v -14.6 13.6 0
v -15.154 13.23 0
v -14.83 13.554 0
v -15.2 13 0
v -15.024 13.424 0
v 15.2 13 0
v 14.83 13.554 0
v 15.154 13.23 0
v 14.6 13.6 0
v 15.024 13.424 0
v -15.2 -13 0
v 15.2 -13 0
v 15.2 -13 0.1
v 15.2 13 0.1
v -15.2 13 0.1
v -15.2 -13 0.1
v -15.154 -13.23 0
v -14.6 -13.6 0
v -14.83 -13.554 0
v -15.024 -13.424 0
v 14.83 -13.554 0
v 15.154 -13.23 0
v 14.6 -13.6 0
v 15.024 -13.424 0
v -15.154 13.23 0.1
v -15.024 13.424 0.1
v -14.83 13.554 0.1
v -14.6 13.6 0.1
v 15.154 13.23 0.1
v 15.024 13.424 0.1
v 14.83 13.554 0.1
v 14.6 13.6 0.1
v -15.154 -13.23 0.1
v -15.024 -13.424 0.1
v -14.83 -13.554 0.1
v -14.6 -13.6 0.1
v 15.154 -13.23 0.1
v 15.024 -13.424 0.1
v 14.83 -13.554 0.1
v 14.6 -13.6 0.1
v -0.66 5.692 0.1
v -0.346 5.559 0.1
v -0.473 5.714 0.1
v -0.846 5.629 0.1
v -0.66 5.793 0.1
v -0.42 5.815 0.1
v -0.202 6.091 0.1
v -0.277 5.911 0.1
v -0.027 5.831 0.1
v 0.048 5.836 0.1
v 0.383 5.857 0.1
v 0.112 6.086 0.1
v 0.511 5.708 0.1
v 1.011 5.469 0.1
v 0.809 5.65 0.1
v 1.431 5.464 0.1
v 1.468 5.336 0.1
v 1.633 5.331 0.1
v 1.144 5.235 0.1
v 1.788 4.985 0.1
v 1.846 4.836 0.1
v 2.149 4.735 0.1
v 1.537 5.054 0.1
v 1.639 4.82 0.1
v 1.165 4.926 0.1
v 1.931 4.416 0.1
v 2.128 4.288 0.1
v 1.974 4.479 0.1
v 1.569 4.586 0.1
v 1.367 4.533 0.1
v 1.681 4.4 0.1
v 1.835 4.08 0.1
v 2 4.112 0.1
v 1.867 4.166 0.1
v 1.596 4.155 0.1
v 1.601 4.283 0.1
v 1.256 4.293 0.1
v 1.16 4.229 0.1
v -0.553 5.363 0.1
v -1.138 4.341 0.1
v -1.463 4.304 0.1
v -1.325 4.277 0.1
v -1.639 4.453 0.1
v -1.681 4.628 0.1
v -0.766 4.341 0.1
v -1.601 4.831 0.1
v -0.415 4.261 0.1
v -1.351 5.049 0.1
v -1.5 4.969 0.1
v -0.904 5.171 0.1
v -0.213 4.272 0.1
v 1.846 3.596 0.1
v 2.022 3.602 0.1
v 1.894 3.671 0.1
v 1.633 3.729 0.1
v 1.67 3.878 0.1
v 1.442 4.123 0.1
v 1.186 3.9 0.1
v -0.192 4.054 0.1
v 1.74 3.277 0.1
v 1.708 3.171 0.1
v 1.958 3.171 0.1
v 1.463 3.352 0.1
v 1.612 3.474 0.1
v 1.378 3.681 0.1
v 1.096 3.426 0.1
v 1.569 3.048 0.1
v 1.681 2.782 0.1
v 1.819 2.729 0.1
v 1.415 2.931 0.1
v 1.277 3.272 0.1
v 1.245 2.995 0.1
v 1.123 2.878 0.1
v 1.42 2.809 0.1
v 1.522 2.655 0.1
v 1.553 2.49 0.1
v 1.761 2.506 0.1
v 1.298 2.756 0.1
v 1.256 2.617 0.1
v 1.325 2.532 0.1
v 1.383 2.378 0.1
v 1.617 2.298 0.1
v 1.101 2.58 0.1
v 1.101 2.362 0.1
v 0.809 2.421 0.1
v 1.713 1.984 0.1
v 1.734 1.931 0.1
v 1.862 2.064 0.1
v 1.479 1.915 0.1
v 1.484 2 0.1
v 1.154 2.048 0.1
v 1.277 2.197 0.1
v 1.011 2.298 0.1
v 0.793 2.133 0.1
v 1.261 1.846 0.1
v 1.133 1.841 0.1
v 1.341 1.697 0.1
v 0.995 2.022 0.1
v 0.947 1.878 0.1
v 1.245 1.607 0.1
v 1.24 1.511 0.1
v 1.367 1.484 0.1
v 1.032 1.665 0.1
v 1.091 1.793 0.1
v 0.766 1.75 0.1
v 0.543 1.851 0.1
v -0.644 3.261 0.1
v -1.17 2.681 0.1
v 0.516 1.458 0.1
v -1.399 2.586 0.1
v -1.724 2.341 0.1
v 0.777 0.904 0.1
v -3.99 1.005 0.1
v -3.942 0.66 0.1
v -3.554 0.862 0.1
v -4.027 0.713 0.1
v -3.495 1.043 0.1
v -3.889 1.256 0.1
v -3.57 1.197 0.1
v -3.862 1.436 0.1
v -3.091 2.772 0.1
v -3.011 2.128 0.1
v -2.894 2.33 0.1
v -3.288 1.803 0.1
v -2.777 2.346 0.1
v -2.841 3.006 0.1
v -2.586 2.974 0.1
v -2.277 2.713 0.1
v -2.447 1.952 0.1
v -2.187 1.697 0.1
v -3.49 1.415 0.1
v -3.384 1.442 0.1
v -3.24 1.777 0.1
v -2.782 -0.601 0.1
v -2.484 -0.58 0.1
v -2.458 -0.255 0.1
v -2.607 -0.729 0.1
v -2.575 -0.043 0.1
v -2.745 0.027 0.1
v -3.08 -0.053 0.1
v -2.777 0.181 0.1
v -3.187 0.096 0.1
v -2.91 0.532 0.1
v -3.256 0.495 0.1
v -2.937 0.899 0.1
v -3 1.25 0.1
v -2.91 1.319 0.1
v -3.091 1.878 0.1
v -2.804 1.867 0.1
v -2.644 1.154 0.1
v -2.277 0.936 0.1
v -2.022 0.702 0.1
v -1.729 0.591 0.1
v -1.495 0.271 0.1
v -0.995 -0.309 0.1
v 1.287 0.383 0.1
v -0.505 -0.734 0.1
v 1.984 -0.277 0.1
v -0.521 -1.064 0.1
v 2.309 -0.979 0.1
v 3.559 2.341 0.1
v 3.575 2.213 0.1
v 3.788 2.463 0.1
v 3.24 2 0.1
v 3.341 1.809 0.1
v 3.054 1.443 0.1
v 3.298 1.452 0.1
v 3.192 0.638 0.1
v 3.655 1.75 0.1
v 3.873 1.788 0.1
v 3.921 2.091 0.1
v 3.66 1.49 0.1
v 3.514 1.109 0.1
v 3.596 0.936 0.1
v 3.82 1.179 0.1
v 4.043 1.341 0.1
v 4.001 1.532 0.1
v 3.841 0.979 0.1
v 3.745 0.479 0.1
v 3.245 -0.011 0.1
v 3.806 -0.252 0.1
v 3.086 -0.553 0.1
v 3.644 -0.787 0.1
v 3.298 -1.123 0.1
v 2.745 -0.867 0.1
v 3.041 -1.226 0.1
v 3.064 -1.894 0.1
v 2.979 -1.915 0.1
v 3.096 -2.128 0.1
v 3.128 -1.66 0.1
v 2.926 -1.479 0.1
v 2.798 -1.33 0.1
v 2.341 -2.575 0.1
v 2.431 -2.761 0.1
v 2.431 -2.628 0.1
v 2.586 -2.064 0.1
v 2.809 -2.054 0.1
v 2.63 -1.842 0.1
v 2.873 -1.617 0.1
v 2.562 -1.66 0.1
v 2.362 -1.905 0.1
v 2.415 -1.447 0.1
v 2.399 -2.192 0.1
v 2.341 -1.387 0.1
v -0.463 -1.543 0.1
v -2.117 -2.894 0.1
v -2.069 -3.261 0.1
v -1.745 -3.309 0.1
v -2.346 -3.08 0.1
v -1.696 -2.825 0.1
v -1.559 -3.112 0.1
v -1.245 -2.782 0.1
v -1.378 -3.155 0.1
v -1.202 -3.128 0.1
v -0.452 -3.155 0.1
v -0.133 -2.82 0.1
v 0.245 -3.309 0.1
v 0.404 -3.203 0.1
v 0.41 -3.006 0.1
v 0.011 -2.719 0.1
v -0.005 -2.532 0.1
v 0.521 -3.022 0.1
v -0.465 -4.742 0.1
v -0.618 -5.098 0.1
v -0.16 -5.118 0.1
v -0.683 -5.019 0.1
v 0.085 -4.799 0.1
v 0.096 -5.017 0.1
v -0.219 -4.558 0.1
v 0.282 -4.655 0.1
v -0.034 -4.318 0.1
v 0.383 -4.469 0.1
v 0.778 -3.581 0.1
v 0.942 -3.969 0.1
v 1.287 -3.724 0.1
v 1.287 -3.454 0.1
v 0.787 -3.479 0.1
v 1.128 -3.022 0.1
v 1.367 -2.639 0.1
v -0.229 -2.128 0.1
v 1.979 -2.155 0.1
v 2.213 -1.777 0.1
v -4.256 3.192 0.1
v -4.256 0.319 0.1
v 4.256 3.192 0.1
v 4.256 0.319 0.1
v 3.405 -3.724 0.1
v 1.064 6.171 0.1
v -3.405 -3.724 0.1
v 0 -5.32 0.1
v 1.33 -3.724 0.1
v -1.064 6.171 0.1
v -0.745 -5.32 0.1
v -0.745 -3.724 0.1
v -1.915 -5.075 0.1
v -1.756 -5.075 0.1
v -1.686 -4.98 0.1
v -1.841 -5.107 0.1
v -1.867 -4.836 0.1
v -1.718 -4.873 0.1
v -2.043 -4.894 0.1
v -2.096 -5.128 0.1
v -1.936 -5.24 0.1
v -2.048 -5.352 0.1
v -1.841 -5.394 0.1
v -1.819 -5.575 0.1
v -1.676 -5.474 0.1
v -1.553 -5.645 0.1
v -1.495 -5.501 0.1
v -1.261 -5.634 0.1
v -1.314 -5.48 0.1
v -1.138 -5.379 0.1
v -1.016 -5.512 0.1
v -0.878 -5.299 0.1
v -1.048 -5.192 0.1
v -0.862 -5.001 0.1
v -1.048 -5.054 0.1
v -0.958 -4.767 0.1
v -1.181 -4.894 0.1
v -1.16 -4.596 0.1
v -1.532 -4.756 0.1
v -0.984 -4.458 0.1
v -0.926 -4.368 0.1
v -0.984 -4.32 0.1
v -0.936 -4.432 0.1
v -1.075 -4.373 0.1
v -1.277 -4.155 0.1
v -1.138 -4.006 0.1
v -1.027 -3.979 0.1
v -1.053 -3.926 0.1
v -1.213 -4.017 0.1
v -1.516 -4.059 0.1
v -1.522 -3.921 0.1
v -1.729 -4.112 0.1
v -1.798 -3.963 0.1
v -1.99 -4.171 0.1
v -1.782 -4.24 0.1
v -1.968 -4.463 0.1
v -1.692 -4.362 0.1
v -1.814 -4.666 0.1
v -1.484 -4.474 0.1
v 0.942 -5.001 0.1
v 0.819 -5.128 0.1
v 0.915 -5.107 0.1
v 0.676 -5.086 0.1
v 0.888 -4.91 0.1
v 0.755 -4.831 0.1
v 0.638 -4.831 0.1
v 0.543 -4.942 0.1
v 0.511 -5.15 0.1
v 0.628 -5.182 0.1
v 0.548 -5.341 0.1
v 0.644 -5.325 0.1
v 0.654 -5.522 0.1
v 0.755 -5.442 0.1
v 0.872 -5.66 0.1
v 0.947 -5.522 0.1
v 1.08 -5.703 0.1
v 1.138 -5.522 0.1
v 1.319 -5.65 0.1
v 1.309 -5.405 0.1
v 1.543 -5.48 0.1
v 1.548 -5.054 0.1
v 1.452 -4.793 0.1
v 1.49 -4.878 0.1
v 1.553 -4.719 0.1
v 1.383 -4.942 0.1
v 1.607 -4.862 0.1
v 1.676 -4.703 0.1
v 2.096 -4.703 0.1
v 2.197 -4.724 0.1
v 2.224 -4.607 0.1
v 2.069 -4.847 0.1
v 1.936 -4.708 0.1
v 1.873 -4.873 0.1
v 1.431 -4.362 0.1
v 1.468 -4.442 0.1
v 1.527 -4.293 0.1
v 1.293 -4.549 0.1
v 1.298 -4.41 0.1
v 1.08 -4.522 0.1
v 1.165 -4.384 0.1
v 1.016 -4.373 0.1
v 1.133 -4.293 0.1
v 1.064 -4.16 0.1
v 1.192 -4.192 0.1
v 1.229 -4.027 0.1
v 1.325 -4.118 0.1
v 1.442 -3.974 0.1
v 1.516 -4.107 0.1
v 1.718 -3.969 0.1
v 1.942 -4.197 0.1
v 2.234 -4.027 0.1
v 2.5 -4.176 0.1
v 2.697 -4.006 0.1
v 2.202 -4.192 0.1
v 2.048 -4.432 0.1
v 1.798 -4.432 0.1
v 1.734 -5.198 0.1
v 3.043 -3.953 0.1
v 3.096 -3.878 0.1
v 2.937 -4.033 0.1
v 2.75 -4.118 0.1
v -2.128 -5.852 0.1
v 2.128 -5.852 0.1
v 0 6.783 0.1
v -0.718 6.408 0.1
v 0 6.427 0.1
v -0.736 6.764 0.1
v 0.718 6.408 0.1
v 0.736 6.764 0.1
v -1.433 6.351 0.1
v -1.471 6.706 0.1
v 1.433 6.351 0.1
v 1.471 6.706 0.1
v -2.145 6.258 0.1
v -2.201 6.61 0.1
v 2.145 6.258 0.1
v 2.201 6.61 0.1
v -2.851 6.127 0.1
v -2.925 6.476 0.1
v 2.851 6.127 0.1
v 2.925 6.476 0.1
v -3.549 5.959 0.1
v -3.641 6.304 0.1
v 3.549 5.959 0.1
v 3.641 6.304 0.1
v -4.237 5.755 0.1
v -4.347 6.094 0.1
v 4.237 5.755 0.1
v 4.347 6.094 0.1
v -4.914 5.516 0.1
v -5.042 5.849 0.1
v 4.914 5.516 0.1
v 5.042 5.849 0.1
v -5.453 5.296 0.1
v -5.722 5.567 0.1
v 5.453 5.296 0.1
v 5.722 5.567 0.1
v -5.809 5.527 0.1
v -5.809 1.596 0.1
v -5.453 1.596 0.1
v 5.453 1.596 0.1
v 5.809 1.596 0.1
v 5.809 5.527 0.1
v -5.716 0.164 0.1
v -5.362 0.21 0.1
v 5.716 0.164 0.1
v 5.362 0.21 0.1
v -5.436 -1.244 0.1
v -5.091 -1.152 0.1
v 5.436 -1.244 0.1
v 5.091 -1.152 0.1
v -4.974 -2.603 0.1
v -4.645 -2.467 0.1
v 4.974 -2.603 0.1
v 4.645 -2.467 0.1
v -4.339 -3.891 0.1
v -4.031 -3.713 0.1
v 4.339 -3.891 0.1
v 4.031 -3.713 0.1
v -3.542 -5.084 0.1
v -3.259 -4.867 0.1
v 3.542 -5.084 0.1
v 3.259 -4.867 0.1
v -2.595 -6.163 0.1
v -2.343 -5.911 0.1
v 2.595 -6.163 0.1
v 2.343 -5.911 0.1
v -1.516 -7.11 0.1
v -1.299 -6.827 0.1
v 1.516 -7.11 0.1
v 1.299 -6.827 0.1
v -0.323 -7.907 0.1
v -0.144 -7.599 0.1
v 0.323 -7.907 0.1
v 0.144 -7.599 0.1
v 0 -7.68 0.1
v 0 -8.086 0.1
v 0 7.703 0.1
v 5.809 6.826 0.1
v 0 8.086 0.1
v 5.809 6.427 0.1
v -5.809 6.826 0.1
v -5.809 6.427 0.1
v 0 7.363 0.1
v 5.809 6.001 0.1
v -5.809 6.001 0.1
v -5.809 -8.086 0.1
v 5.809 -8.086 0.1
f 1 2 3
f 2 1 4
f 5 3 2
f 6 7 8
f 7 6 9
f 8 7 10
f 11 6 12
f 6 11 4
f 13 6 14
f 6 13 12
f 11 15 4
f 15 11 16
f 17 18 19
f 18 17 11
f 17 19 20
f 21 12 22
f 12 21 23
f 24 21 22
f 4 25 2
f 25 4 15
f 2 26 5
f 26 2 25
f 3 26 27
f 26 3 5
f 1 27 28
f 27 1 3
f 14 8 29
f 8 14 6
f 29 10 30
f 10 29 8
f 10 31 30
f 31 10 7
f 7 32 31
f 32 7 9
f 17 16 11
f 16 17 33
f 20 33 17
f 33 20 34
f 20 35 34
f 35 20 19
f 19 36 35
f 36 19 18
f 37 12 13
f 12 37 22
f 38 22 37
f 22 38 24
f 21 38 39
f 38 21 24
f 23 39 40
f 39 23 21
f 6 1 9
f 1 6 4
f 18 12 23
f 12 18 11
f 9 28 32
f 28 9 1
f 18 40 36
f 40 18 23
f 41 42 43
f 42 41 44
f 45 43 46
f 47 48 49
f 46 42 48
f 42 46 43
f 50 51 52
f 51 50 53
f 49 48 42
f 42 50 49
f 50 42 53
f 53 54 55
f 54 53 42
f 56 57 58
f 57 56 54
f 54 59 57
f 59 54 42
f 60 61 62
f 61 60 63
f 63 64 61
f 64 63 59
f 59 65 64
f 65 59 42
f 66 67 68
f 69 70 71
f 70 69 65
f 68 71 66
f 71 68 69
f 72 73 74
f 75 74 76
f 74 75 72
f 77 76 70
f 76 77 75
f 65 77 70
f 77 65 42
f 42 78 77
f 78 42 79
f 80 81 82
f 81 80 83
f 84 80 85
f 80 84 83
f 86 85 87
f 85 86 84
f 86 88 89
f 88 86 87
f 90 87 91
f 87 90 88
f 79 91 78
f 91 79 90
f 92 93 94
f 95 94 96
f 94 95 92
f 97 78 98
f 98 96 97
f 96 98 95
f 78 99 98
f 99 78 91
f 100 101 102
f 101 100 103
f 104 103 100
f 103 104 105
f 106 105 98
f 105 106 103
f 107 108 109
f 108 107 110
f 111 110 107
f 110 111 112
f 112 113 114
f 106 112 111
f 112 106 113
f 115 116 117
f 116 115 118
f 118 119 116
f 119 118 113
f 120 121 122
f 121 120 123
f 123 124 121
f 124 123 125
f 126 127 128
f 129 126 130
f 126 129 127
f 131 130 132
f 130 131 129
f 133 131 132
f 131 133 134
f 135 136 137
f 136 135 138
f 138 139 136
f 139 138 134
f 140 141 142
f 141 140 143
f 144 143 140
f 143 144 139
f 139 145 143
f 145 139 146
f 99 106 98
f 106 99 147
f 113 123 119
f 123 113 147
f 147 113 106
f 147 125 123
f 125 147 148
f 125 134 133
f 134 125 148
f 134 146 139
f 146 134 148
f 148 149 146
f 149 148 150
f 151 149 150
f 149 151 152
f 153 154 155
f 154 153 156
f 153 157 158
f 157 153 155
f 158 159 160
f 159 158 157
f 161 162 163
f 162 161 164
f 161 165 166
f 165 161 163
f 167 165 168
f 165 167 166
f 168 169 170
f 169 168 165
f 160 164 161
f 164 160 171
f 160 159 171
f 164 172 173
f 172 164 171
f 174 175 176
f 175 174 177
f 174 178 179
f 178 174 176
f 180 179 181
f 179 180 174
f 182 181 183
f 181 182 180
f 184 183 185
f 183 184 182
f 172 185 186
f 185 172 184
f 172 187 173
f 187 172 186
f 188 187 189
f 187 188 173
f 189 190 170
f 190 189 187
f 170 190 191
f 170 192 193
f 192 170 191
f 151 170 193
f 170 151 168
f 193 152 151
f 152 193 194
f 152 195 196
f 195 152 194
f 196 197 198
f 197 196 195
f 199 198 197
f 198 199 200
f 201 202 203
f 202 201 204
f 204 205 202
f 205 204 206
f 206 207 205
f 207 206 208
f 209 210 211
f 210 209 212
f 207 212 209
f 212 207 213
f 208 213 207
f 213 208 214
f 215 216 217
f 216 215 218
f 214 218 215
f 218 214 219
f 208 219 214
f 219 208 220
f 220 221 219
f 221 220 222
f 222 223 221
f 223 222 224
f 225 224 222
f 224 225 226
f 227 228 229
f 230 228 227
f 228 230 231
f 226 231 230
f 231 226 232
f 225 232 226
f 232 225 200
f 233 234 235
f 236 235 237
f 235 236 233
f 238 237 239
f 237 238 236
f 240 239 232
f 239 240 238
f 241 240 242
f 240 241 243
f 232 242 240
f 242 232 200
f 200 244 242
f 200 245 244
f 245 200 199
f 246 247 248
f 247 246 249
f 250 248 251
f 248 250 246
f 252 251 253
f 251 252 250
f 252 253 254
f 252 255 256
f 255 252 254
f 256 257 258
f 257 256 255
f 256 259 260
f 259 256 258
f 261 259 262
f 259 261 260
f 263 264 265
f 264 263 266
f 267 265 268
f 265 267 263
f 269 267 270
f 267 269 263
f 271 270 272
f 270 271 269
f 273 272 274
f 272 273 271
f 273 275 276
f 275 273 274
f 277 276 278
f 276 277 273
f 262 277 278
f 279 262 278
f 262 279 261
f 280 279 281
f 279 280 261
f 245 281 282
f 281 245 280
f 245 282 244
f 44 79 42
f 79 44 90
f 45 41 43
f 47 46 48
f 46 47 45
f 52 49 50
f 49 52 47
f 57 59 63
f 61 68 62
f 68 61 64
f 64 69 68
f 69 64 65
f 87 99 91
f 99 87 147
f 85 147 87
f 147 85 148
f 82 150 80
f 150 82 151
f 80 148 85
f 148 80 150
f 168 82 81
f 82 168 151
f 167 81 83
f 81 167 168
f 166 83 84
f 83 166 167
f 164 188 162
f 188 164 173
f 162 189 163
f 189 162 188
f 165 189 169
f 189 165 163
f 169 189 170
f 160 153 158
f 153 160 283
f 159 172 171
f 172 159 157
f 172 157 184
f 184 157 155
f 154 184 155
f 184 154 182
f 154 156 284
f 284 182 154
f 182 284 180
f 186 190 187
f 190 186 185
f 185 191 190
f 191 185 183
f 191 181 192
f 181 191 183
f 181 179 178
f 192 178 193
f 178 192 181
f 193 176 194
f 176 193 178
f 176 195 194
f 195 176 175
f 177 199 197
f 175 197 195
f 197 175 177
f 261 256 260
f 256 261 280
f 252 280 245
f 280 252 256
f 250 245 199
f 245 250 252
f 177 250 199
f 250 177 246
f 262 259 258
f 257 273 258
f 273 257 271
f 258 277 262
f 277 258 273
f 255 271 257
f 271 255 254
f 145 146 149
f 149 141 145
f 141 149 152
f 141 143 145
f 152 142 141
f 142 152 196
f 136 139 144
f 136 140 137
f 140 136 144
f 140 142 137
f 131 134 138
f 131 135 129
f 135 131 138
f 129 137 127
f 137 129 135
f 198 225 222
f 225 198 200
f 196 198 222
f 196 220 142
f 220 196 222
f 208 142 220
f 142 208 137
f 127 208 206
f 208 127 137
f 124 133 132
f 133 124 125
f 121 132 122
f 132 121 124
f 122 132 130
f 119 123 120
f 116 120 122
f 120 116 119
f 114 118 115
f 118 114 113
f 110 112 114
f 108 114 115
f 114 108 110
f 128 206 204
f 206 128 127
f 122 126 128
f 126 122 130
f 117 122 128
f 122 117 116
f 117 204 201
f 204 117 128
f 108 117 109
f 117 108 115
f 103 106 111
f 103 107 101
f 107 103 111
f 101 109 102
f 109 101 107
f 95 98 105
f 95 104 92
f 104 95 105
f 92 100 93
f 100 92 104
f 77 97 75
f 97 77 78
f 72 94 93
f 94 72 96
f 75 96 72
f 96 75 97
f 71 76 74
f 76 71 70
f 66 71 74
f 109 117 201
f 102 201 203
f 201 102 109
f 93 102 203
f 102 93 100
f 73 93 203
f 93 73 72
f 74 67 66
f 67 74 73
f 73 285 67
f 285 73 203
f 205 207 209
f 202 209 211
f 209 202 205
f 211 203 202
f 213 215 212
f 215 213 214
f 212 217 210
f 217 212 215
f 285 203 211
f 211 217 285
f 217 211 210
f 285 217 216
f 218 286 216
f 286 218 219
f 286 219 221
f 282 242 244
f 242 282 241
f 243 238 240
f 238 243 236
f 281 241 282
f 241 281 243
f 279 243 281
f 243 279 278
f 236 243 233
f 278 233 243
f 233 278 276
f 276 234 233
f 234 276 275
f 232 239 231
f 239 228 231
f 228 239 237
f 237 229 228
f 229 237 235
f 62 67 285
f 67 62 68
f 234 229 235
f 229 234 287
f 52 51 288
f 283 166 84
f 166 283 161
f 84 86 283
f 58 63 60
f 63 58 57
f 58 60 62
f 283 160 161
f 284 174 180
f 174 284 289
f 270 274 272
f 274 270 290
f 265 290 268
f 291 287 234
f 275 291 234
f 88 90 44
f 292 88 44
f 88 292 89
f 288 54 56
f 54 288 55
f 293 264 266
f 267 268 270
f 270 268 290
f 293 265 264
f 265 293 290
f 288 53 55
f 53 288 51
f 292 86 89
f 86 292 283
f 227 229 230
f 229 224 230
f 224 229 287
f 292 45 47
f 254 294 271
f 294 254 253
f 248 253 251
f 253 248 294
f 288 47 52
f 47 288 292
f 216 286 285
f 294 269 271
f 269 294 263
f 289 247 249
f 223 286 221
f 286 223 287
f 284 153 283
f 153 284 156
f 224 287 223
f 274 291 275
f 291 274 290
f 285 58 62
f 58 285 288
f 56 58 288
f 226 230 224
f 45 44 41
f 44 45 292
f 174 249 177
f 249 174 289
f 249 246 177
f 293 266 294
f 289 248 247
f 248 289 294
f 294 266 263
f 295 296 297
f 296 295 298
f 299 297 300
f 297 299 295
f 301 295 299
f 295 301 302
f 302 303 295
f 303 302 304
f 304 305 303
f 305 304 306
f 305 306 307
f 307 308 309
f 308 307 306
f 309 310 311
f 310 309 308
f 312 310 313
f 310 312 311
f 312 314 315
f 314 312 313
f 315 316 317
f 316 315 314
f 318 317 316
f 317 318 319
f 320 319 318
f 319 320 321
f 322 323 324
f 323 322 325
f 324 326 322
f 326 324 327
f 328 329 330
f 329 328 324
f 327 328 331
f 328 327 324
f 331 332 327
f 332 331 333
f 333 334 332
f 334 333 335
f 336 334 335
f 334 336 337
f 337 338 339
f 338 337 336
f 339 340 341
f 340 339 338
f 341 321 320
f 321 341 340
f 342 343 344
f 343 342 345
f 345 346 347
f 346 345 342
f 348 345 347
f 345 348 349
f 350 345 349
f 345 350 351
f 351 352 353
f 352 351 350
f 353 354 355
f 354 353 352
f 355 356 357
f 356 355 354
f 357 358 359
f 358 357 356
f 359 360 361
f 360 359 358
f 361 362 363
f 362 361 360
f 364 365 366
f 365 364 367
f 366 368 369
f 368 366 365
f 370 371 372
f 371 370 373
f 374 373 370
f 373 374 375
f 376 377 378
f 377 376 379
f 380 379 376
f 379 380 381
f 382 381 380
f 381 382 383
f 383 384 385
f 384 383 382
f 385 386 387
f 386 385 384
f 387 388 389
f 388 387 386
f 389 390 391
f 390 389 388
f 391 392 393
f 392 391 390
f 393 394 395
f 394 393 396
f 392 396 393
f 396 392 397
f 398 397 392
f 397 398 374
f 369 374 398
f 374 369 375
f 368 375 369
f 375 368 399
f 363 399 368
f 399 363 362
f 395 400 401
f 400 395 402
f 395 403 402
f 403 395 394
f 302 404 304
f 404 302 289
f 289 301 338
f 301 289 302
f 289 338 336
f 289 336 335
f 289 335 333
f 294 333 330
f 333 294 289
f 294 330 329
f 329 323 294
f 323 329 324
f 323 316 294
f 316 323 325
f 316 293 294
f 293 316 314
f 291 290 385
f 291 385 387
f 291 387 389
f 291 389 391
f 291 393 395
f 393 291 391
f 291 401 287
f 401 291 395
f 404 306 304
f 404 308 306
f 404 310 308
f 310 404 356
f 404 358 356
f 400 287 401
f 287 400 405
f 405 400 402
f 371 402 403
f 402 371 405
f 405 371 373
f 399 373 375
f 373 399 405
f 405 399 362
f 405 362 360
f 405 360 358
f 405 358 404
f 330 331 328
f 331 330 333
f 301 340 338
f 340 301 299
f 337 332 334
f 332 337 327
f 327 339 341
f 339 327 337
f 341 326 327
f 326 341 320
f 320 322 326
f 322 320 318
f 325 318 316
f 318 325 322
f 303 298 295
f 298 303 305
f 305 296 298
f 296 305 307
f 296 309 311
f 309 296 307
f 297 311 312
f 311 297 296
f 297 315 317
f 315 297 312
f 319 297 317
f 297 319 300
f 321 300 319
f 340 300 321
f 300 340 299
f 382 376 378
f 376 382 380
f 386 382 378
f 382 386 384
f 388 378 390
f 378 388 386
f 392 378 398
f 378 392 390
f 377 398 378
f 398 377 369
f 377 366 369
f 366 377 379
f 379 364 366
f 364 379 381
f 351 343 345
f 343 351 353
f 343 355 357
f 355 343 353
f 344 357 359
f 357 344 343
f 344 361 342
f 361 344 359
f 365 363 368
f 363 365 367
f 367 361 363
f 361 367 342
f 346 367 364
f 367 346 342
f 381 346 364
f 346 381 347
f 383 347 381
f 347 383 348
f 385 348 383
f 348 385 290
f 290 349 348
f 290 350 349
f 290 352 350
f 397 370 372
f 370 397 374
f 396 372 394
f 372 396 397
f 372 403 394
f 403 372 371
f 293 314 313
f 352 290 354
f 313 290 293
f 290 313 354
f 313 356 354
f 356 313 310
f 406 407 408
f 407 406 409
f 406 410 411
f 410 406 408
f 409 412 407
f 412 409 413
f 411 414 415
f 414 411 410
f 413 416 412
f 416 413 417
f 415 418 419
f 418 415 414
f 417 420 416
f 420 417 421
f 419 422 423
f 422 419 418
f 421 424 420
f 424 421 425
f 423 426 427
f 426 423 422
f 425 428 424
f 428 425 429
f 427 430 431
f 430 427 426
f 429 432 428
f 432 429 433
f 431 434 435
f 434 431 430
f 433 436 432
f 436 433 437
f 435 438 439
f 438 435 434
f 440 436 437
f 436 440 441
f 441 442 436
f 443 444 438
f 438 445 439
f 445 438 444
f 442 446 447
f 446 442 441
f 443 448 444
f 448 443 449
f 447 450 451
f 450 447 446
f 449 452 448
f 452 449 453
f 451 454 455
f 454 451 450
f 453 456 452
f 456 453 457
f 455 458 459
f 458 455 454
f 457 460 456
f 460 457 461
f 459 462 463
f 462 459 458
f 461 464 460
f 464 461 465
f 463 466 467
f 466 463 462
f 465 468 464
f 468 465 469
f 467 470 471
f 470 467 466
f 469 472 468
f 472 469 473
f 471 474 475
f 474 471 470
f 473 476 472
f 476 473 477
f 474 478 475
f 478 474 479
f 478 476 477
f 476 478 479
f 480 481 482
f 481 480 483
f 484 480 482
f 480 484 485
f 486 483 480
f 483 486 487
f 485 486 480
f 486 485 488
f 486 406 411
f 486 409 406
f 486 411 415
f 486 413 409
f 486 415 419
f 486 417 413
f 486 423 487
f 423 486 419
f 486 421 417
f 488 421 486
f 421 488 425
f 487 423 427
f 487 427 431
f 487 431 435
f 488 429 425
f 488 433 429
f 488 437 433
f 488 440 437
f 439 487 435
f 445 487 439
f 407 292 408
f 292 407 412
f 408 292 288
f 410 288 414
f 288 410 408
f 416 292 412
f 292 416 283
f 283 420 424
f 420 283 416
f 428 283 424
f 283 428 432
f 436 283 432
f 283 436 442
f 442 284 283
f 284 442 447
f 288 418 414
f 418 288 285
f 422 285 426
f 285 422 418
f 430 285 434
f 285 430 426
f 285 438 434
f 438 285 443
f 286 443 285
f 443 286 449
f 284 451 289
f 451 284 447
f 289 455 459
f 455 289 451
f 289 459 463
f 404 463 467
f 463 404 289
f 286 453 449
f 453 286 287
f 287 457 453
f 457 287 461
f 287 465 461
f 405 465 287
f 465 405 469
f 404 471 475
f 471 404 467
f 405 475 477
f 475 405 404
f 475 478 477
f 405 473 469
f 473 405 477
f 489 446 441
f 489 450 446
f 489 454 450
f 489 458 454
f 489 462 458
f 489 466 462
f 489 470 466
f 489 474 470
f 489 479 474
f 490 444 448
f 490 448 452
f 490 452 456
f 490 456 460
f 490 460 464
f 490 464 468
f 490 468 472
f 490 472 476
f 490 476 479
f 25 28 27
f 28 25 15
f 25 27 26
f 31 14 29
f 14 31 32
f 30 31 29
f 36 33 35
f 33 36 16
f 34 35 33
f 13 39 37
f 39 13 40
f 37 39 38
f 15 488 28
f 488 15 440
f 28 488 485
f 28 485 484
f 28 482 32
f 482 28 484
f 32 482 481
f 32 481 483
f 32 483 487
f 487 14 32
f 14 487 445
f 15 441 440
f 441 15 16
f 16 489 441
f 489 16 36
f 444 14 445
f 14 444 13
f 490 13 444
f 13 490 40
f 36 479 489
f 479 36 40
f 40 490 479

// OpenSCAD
use <../lib.scad>
use <../p/1-4chrd.scad>
use <../p/logo-ferrari-badge-rounded-box.scad>
use <../p/logo-ferrari-badge-simplified-rounded.scad>
use <s/stickerback034x038.scad>
function ldraw_lib__6177970a() = [
// 0 Sticker  3.4 x  3.8 with Ferrari Logo on Red Background
// 0 Name: 6177970a.dat
// 0 Author: Massimo Maso [Sirio]
// 0 !LDRAW_ORG Part UPDATE 2025-08
// 0 !LICENSE Licensed under CC BY 4.0 : see CAreadme.txt
// 
// 0 !HELP To place on part 59349 at the same Z of 6177970b, use:
// 0 !HELP 1 4 0 52 -10 1 0 0 0 0 -1 0 1 0 6177970a.dat
// 
// 0 BFC CERTIFY CCW
  [0,"BFC","CERTIFY"],
  [0,"BFC","CCW"],
// 
// 0 !KEYWORDS BrickLink 75882stk01, Center, Development, Ferrari, FXXK
// 0 !KEYWORDS Rebrickable 30899, Set 75882, Speed Champions, Tunnel, Wind
// 
// 0 !HISTORY 2025-08-31 [OrionP] Official Update 2025-08
// 
// 0 // Stickerback
// 1 16 0 0 0 1 0 0 0 1 0 0 0 1 s\stickerback034x038.dat
  [1,16,0,0,0,1,0,0,0,1,0,0,0,1, ldraw_lib__s__stickerback034x038()],
// 0 // Logo primtives
// 1 4 0 -.25 0 2.66 0 0 0 1 0 0 0 2.66 logo-ferrari-badge-simplified-rounded.dat
  [1,4,0,-.25,0,2.66,0,0,0,1,0,0,0,2.66, ldraw_lib__logo_ferrari_badge_simplified_rounded()],
// 1 4 0 -.25 0 2.66 0 0 0 1 0 0 0 2.66 logo-ferrari-badge-rounded-box.dat
  [1,4,0,-.25,0,2.66,0,0,0,1,0,0,0,2.66, ldraw_lib__logo_ferrari_badge_rounded_box()],
// 0 // Primitives
// 1 4 -36.5 -.25 32.5 -1.5 0 0 0 1 0 0 0 1.5 1-4chrd.dat
  [1,4,-36.5,-.25,32.5,-1.5,0,0,0,1,0,0,0,1.5, ldraw_lib__1_4chrd()],
// 1 4 36.5 -.25 32.5 1.5 0 0 0 1 0 0 0 1.5 1-4chrd.dat
  [1,4,36.5,-.25,32.5,1.5,0,0,0,1,0,0,0,1.5, ldraw_lib__1_4chrd()],
// 1 4 -36.5 -.25 -32.5 -1.5 0 0 0 1 0 0 0 -1.5 1-4chrd.dat
  [1,4,-36.5,-.25,-32.5,-1.5,0,0,0,1,0,0,0,-1.5, ldraw_lib__1_4chrd()],
// 1 4 36.5 -.25 -32.5 1.5 0 0 0 1 0 0 0 -1.5 1-4chrd.dat
  [1,4,36.5,-.25,-32.5,1.5,0,0,0,1,0,0,0,-1.5, ldraw_lib__1_4chrd()],
// 0 // Top face
// 4 4 -36.5 -.25 34 -38 -.25 32.5 -14.5236 -.25 13.8187 -14.5236 -.25 15.0024
  [4,4,-36.5,-.25,34,-38,-.25,32.5,-14.5236,-.25,13.8187,-14.5236,-.25,15.0024],
// 3 4 -36.5 -.25 34 -14.5236 -.25 15.0024 -14.5236 -.25 16.0664
  [3,4,-36.5,-.25,34,-14.5236,-.25,15.0024,-14.5236,-.25,16.0664],
// 3 4 -36.5 -.25 34 -14.5236 -.25 16.0664 -14.5236 -.25 17.0639
  [3,4,-36.5,-.25,34,-14.5236,-.25,16.0664,-14.5236,-.25,17.0639],
// 4 4 36.5 -.25 34 -36.5 -.25 34 -14.5236 -.25 17.0639 0 -.25 20.216
  [4,4,36.5,-.25,34,-36.5,-.25,34,-14.5236,-.25,17.0639,0,-.25,20.216],
// 3 4 36.5 -.25 34 0 -.25 20.216 14.5236 -.25 17.0639
  [3,4,36.5,-.25,34,0,-.25,20.216,14.5236,-.25,17.0639],
// 3 4 36.5 -.25 34 14.5236 -.25 17.0639 14.5236 -.25 16.0664
  [3,4,36.5,-.25,34,14.5236,-.25,17.0639,14.5236,-.25,16.0664],
// 3 4 36.5 -.25 34 14.5236 -.25 16.0664 14.5236 -.25 15.0024
  [3,4,36.5,-.25,34,14.5236,-.25,16.0664,14.5236,-.25,15.0024],
// 4 4 36.5 -.25 34 14.5236 -.25 15.0024 14.5236 -.25 13.8187 38 -.25 32.5
  [4,4,36.5,-.25,34,14.5236,-.25,15.0024,14.5236,-.25,13.8187,38,-.25,32.5],
// 4 4 -38 -.25 -32.5 -14.5236 -.25 3.99 -14.5236 -.25 13.8187 -38 -.25 32.5
  [4,4,-38,-.25,-32.5,-14.5236,-.25,3.99,-14.5236,-.25,13.8187,-38,-.25,32.5],
// 4 4 -38 -.25 -32.5 -36.5 -.25 -34 -14.5236 -.25 -20.216 -14.5236 -.25 3.99
  [4,4,-38,-.25,-32.5,-36.5,-.25,-34,-14.5236,-.25,-20.216,-14.5236,-.25,3.99],
// 4 4 38 -.25 -32.5 38 -.25 32.5 14.5236 -.25 13.8187 14.5236 -.25 3.99
  [4,4,38,-.25,-32.5,38,-.25,32.5,14.5236,-.25,13.8187,14.5236,-.25,3.99],
// 4 4 38 -.25 -32.5 14.5236 -.25 3.99 14.5236 -.25 -20.216 36.5 -.25 -34
  [4,4,38,-.25,-32.5,14.5236,-.25,3.99,14.5236,-.25,-20.216,36.5,-.25,-34],
// 4 4 -14.5236 -.25 -20.216 -36.5 -.25 -34 36.5 -.25 -34 0 -.25 -20.216
  [4,4,-14.5236,-.25,-20.216,-36.5,-.25,-34,36.5,-.25,-34,0,-.25,-20.216],
// 3 4 36.5 -.25 -34 14.5236 -.25 -20.216 0 -.25 -20.216
  [3,4,36.5,-.25,-34,14.5236,-.25,-20.216,0,-.25,-20.216],
];
module ldraw_lib__6177970a(step=0, col=false, unit=2/5, alt=false, line=0.2, solid=!$preview)
    makepoly(ldraw_lib__6177970a(), step=step, col=col, unit=unit, alt=alt, line=line, solid=solid);
ldraw_lib__6177970a(line=0.2);
